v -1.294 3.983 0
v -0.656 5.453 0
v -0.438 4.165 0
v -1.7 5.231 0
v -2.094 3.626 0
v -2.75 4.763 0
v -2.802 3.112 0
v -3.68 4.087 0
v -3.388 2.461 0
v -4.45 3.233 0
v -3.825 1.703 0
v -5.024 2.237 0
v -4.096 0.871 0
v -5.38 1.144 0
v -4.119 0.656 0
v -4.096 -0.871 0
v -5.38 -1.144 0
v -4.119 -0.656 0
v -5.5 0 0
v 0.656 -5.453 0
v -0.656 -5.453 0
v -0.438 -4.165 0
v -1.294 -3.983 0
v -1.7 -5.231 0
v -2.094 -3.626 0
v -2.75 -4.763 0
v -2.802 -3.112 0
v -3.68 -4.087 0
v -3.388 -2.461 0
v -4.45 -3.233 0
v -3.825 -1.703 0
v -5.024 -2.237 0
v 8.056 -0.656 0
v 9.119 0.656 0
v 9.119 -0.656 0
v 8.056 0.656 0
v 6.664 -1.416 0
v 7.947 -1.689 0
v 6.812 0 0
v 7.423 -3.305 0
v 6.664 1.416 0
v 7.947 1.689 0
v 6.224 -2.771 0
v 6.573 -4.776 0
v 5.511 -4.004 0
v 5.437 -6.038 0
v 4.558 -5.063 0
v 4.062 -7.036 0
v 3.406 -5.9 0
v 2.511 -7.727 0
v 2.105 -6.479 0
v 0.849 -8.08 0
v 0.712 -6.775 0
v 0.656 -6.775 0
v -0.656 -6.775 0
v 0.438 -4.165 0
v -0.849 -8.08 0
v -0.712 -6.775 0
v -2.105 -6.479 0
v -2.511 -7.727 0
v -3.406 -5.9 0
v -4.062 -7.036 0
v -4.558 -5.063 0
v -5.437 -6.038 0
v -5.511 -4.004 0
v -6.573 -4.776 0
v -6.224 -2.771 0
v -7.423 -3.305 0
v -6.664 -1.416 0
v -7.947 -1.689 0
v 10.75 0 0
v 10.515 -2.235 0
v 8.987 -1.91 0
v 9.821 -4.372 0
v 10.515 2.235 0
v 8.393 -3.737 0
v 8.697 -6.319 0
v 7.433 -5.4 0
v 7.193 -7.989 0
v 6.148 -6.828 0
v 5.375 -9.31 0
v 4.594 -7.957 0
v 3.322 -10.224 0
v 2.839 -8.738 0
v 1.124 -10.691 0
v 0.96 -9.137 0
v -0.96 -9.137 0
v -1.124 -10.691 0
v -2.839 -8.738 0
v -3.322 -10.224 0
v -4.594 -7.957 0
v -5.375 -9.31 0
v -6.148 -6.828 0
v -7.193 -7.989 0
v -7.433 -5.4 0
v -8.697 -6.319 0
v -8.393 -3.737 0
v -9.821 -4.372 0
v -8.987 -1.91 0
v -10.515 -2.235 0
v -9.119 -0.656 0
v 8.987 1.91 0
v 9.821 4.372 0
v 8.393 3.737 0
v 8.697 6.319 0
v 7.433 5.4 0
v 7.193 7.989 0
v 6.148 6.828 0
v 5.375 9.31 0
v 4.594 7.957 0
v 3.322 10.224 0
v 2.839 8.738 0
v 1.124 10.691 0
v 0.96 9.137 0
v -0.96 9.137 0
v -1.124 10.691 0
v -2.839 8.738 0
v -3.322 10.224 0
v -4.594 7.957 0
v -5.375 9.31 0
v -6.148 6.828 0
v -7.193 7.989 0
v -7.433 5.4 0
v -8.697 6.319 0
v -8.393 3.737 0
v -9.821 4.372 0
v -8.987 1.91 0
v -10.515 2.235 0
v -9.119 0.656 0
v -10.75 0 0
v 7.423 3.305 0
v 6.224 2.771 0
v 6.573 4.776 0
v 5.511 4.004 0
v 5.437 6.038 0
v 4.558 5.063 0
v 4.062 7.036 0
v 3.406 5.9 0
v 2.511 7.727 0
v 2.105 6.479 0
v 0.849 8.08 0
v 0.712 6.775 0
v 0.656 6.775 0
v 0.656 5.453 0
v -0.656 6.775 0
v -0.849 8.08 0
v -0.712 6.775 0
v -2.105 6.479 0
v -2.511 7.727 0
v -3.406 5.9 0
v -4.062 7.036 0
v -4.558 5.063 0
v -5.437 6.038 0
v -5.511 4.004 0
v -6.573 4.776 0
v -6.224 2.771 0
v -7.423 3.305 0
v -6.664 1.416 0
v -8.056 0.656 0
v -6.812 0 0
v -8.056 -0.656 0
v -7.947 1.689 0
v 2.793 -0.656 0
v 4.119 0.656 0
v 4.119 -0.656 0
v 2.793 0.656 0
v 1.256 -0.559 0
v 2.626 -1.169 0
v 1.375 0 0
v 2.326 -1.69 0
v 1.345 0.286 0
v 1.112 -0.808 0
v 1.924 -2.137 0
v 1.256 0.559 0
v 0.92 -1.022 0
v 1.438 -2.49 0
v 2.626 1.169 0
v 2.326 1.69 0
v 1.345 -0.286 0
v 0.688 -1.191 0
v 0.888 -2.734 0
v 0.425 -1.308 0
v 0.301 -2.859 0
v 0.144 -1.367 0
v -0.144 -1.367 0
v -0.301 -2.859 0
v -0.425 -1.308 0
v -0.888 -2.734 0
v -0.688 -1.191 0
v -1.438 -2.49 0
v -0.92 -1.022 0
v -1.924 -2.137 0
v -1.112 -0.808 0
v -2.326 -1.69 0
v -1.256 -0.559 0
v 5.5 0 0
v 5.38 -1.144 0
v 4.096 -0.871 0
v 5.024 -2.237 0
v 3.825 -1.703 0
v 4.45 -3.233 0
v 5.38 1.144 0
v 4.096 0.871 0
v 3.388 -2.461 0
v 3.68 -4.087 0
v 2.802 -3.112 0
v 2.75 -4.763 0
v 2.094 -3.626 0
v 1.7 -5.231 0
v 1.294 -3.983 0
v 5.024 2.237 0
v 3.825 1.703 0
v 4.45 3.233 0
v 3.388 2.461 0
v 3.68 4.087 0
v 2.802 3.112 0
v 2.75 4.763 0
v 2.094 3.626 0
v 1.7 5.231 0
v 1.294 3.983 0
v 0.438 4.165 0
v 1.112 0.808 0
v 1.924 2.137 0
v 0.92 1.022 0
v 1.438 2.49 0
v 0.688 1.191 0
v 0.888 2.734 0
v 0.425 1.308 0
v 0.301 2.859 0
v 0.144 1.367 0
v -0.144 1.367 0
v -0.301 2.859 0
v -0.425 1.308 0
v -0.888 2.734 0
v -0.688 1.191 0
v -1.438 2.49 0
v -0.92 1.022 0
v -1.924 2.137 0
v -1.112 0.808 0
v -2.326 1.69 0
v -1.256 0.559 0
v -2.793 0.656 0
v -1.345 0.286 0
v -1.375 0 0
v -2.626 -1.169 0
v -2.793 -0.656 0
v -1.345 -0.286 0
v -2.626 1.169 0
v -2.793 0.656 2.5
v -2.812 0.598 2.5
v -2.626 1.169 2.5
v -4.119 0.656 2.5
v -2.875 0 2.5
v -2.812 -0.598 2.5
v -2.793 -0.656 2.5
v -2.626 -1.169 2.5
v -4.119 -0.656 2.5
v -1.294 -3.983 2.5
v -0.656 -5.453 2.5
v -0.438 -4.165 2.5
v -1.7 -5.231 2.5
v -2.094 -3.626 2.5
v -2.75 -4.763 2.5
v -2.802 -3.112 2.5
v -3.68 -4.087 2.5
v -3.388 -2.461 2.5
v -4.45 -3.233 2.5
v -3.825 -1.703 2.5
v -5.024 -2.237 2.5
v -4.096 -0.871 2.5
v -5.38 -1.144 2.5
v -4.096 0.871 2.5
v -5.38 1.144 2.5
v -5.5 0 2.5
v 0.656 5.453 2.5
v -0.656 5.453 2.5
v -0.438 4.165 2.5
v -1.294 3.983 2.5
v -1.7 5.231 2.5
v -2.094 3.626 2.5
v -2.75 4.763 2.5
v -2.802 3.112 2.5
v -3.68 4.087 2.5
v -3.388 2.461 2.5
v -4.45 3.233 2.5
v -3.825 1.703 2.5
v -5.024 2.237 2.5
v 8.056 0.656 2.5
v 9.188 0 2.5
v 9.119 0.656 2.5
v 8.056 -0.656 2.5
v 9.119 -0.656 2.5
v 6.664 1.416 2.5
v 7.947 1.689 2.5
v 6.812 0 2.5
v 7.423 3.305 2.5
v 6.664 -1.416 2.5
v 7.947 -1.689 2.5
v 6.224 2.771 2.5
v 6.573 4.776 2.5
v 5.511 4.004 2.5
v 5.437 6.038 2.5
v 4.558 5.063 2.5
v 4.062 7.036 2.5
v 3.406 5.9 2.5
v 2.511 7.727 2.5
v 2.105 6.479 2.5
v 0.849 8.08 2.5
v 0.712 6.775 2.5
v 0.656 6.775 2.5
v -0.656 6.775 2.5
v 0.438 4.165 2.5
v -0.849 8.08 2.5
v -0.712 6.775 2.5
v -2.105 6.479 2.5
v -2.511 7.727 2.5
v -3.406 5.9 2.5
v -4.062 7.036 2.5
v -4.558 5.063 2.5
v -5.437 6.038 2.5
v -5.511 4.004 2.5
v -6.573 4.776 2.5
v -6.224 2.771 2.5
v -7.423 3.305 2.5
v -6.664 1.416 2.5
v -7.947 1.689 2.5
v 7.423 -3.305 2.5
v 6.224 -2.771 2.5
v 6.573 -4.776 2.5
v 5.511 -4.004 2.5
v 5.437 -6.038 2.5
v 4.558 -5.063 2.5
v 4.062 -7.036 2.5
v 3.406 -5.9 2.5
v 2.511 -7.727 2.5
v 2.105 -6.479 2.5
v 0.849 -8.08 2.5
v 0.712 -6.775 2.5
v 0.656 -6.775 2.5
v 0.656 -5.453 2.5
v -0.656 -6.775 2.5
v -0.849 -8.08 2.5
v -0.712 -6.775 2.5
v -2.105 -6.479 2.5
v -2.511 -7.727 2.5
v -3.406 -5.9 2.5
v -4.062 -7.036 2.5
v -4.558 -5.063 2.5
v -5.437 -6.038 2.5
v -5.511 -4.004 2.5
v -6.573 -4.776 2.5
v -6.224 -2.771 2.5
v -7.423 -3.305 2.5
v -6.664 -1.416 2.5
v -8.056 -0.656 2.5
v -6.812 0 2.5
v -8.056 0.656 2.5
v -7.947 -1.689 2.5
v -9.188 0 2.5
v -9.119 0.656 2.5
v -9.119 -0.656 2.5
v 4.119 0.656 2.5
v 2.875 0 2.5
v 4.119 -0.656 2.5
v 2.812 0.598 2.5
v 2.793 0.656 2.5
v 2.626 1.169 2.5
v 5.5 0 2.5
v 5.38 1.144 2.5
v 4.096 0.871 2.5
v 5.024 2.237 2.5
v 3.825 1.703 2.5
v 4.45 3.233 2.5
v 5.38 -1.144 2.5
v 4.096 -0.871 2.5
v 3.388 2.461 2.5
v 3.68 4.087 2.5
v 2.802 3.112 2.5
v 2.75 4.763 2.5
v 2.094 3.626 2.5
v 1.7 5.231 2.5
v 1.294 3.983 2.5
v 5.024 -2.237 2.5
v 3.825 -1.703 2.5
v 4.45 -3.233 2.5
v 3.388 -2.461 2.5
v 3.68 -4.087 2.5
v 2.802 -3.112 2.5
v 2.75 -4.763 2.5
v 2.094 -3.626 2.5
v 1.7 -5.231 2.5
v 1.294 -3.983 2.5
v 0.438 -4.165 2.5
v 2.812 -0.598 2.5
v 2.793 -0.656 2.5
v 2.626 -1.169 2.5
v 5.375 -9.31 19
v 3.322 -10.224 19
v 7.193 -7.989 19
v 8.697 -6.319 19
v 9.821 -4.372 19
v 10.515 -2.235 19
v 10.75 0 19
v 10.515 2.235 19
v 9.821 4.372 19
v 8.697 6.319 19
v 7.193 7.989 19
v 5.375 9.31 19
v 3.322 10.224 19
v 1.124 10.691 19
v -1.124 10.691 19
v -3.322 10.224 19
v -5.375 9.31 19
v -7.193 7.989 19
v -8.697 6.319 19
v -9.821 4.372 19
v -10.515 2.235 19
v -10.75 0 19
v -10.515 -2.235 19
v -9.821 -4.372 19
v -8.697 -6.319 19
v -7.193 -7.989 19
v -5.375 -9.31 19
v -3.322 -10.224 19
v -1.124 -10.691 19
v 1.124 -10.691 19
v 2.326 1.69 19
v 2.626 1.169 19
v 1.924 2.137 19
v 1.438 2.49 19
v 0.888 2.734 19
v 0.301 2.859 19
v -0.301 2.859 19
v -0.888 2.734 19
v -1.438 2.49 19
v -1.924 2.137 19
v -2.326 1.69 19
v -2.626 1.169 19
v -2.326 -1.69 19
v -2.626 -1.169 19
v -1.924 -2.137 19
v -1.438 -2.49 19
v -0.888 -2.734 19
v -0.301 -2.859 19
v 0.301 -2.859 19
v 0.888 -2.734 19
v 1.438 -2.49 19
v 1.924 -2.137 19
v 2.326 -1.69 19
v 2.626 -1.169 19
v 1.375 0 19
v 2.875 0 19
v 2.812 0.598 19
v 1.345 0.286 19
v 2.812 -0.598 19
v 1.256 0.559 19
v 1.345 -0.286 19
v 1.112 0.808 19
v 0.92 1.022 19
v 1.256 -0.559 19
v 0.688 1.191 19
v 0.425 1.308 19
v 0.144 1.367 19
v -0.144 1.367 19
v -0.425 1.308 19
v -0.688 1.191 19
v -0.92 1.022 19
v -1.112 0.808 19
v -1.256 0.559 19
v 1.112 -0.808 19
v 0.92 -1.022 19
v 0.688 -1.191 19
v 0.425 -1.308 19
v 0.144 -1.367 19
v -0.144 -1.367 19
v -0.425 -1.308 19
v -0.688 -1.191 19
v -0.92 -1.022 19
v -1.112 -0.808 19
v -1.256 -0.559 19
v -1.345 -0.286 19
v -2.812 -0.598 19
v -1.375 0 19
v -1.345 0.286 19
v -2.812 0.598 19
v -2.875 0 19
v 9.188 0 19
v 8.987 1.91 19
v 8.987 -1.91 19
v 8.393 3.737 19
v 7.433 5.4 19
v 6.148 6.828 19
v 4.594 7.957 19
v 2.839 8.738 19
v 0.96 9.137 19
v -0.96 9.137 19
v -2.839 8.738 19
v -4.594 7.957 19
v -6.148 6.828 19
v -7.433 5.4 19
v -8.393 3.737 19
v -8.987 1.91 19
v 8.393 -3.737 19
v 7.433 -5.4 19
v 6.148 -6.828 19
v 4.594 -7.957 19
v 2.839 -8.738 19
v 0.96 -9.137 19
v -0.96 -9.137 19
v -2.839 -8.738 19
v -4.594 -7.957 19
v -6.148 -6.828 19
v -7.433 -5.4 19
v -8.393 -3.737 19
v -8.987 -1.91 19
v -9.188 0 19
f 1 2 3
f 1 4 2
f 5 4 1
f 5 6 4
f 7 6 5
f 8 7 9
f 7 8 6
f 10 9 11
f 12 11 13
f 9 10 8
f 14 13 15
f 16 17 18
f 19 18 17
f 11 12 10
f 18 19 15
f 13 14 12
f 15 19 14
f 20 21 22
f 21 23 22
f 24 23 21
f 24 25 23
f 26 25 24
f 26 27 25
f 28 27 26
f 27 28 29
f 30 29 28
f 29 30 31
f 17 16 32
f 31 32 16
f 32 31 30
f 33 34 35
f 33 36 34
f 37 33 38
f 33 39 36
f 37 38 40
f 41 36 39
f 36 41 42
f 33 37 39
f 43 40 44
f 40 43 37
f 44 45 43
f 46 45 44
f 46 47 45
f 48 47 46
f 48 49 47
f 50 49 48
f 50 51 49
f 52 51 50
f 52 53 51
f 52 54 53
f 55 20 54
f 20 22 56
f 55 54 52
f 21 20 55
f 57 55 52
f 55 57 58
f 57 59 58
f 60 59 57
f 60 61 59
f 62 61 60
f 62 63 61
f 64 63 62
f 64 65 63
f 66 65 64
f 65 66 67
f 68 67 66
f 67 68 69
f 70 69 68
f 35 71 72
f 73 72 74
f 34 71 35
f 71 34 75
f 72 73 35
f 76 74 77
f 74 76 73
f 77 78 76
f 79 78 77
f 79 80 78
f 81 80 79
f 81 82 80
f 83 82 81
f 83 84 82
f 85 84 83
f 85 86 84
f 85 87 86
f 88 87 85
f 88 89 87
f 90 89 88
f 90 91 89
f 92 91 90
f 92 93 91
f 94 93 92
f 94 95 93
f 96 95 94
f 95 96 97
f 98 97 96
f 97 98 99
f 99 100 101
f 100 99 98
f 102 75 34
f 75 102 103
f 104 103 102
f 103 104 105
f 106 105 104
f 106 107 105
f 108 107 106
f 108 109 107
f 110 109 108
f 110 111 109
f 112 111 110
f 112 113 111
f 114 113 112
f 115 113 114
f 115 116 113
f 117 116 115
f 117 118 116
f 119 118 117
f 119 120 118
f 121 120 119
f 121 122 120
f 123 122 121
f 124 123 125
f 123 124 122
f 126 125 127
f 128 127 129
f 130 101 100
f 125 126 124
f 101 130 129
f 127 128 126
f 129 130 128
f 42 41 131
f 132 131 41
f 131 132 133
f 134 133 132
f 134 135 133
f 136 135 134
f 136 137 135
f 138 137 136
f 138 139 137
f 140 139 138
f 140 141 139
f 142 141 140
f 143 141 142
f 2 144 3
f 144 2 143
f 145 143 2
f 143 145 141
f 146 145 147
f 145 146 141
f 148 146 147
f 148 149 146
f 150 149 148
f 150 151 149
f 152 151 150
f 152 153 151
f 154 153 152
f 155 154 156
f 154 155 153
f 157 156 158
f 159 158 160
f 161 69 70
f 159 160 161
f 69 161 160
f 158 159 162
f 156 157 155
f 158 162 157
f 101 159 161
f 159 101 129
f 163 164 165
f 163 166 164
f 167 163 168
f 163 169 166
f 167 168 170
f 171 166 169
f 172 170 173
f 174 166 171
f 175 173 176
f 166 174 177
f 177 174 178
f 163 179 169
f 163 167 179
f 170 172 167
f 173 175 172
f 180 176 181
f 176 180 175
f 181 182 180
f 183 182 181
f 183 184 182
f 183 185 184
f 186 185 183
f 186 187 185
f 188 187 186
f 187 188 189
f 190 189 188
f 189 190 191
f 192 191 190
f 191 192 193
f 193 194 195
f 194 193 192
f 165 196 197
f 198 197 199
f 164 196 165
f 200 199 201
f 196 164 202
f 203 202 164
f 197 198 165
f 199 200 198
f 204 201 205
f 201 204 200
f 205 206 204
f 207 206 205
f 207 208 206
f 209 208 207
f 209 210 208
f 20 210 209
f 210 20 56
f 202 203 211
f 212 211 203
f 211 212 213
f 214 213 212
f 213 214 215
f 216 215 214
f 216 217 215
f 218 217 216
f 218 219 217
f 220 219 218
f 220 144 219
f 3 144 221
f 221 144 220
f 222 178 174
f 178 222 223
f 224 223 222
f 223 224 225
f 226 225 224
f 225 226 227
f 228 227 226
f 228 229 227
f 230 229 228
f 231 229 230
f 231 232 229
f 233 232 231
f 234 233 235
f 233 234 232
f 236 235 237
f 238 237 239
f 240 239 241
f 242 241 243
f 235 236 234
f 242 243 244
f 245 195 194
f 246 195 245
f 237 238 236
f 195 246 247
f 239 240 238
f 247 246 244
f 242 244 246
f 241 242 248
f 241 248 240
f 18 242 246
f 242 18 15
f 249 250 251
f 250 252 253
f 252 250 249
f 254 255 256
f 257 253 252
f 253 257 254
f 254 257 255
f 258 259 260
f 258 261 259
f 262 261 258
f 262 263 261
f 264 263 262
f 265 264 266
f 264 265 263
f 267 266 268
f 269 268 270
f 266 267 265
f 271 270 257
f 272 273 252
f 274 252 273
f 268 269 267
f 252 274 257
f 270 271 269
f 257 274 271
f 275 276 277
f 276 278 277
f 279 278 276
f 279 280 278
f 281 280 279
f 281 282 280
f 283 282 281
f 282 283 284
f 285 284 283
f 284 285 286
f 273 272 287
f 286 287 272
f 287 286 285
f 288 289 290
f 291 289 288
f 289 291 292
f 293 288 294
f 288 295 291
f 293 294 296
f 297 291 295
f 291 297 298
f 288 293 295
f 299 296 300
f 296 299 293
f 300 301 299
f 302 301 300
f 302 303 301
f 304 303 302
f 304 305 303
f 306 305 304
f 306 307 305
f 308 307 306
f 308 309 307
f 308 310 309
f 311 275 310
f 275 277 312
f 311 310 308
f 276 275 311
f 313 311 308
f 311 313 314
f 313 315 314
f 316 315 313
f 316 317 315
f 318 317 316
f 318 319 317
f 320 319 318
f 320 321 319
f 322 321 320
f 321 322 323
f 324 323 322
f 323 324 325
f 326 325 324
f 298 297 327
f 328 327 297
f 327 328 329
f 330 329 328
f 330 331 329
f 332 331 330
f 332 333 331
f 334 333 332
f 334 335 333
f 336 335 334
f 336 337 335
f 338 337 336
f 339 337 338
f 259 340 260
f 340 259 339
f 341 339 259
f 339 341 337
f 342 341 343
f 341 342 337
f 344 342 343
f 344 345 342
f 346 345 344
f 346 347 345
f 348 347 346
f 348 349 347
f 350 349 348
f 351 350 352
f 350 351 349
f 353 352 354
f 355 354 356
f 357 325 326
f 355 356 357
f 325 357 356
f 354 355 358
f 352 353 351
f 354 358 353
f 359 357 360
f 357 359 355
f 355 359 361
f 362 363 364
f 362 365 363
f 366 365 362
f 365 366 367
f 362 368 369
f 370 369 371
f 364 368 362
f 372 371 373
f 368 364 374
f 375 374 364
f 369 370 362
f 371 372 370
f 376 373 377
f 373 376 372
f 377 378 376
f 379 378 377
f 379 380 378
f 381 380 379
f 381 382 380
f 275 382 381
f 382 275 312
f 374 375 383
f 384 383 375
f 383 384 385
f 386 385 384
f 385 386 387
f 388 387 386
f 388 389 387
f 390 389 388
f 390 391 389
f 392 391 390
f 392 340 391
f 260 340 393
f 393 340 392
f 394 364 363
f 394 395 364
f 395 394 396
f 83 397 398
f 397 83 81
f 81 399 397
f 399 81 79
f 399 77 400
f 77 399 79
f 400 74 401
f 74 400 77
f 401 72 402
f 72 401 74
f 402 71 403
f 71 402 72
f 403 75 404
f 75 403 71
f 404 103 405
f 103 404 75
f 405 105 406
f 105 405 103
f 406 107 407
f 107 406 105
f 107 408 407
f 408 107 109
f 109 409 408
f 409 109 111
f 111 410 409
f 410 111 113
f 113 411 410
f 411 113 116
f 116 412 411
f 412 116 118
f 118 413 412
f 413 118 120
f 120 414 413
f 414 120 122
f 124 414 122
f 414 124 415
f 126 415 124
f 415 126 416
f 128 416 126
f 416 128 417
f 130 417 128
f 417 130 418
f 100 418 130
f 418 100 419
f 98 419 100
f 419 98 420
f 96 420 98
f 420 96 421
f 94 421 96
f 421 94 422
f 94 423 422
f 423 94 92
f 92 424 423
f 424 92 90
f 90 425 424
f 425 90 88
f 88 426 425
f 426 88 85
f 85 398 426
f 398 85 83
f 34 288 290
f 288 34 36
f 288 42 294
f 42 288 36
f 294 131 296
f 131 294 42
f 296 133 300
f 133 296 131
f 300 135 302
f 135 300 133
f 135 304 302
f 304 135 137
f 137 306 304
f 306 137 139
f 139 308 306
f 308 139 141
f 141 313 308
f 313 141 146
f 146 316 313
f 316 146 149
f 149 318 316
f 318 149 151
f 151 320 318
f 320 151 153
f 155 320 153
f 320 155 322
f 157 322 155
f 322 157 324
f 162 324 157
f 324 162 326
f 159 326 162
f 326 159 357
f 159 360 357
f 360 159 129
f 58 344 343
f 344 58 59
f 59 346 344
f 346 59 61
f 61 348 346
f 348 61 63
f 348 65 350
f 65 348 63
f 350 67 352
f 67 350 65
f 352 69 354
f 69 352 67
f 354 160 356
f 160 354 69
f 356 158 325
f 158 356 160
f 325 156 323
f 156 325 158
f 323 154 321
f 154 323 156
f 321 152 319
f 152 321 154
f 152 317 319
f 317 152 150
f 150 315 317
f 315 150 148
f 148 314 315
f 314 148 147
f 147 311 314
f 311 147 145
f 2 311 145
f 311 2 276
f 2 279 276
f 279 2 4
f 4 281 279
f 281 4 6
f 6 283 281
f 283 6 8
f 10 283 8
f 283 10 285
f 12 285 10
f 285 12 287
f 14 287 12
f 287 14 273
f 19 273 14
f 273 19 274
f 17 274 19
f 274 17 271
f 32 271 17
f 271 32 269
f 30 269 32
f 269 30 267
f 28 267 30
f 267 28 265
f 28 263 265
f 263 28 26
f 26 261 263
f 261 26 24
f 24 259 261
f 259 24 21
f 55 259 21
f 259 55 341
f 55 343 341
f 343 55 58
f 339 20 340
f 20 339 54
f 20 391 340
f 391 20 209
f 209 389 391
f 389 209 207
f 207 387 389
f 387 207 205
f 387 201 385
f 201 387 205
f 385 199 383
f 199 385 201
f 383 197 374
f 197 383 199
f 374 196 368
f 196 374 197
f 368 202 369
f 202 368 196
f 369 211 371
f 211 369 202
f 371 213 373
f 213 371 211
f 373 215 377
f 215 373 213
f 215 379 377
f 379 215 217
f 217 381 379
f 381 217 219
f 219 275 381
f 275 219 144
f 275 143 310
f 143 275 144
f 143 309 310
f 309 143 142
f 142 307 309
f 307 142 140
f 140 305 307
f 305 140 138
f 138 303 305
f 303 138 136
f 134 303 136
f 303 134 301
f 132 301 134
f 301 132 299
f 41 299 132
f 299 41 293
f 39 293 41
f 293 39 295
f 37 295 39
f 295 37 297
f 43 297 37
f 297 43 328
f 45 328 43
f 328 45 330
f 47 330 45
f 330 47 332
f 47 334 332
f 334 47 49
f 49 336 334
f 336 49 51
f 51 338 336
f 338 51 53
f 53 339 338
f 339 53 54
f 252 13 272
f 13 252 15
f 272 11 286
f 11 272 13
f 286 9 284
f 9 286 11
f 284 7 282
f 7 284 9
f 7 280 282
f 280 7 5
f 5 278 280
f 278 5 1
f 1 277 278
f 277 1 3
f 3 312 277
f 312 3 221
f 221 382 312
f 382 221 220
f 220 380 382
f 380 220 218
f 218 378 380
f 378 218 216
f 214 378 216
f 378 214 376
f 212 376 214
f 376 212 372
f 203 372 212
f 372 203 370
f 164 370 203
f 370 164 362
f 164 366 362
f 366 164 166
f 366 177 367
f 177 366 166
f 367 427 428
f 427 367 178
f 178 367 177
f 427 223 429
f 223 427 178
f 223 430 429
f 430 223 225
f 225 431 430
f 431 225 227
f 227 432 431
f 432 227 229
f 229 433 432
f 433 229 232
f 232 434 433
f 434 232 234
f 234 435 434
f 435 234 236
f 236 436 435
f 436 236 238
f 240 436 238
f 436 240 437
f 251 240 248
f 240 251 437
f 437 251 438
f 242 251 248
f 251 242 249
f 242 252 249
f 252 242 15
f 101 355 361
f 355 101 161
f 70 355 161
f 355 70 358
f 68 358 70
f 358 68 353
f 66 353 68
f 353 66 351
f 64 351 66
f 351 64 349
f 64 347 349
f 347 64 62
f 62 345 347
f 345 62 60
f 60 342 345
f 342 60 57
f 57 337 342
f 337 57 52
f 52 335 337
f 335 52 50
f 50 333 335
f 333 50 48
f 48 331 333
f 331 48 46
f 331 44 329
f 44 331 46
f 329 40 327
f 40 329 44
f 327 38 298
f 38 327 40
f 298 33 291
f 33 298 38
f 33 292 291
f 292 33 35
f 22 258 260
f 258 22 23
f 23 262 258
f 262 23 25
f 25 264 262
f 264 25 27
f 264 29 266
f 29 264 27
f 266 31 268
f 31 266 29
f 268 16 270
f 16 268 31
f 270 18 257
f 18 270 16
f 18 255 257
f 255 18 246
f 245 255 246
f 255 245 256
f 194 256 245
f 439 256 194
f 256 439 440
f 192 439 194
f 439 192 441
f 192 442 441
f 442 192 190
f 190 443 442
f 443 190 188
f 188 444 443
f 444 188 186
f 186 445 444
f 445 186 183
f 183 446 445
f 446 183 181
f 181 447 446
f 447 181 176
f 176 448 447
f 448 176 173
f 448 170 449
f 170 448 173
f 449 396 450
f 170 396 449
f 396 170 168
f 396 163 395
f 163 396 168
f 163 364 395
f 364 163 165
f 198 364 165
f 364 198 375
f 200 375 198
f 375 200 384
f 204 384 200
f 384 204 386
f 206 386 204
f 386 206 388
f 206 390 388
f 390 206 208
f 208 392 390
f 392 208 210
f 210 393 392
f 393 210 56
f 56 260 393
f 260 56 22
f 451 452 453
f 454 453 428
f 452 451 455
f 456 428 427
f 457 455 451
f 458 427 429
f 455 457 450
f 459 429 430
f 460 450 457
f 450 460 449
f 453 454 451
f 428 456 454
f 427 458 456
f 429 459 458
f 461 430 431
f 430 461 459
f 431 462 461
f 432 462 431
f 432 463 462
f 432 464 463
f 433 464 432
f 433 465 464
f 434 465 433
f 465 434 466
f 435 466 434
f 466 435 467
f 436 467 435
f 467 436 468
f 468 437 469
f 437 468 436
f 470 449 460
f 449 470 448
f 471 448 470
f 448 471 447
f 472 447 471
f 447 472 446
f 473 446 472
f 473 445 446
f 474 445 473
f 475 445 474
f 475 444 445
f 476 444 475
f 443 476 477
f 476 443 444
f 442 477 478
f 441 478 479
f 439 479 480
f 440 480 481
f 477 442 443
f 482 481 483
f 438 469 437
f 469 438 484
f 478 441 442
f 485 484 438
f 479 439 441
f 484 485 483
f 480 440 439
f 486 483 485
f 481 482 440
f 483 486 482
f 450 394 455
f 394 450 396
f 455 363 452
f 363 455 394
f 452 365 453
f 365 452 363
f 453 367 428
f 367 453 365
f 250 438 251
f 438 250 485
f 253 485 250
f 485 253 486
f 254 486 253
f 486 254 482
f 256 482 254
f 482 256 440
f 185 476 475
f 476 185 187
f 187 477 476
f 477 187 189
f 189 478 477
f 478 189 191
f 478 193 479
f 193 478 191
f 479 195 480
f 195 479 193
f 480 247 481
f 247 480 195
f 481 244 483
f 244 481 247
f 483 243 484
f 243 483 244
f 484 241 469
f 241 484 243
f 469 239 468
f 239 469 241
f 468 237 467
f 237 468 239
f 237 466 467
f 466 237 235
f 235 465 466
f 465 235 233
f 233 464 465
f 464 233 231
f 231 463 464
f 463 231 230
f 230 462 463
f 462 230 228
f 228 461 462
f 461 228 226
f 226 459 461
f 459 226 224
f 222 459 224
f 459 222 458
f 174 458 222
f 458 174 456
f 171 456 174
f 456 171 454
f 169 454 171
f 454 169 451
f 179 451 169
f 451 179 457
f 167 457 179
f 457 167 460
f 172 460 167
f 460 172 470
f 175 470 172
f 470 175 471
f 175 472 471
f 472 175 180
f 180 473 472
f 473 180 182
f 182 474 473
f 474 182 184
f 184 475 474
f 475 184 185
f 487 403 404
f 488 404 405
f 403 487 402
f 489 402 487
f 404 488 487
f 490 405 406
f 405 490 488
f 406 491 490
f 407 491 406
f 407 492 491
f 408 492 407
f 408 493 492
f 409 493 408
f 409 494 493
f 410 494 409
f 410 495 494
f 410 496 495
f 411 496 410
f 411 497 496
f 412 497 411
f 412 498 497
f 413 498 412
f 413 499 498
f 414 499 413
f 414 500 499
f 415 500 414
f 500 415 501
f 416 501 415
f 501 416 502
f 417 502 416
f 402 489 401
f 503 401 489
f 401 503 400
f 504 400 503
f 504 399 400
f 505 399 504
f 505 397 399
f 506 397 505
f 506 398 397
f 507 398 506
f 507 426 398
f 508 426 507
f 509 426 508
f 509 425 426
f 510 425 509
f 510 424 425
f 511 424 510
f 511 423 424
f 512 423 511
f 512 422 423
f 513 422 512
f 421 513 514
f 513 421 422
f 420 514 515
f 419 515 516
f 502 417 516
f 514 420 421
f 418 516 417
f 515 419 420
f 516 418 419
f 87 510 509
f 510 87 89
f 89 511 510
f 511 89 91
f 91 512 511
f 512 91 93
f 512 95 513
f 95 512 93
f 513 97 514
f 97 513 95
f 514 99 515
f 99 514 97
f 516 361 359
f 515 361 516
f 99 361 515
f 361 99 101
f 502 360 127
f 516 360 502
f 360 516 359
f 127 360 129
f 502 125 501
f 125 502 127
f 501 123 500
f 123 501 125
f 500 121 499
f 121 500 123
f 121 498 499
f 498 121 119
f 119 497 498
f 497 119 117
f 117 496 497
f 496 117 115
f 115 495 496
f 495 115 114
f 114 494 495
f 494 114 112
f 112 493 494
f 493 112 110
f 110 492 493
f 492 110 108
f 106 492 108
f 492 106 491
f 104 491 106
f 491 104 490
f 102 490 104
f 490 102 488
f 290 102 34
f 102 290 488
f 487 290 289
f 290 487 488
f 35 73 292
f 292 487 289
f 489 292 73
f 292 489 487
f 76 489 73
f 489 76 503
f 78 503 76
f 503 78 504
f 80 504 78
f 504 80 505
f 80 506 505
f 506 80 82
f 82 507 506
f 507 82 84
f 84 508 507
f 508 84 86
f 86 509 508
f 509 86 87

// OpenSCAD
/****************************************************************************
 *   Open-Source Whole Home Water Shutoff System                            *
 *   Copyright 2021 Marcio Teixeira                                         *
 *                                                                          *
 *   This program is free software: you can redistribute it and/or modify   *
 *   it under the terms of the GNU General Public License as published by   *
 *   the Free Software Foundation, either version 3 of the License, or      *
 *   (at your option) any later version.                                    *
 *                                                                          *
 *   This program is distributed in the hope that it will be useful,        *
 *   but WITHOUT ANY WARRANTY; without even the implied warranty of         *
 *   MERCHANTABILITY or FITNESS FOR A PARTICULAR PURPOSE.  See the          *
 *   GNU General Public License for more details.                           *
 *                                                                          *
 *   To view a copy of the GNU General Public License, go to the following  *
 *   location: <http://www.gnu.org/licenses/>.                              *
 ****************************************************************************/

$fn = 30;
outer_dia = 21.5;
inner_dia = 2.75;

module strain_relief(outer_dia, inner_dia, rings = 3) {
    spacing = (outer_dia - inner_dia)/rings;
    for(n = [0:rings]) {
        o = outer_dia - n*spacing;
        difference() {
            circle(d=o);
            if(n < rings)
            circle(d=o - spacing/2);
        }
        if(n < rings)
        for(r = [0,180])
            rotate(n*90 + r)
                translate([(o-spacing*.75)/2,0,0])
                    square([spacing/2,spacing/4], center=true);
    }
}

linear_extrude(2.5)
    difference() {
        strain_relief(outer_dia, inner_dia+3);
        circle(inner_dia);
    }

linear_extrude(19)
    difference() {
        circle(d=inner_dia+3);
        circle(d=inner_dia);
    }
    
linear_extrude(19) {
    spacing = (outer_dia - inner_dia)/3;
    difference() {
        circle(d=outer_dia);
        circle(d=outer_dia-spacing/2);
    }
}
